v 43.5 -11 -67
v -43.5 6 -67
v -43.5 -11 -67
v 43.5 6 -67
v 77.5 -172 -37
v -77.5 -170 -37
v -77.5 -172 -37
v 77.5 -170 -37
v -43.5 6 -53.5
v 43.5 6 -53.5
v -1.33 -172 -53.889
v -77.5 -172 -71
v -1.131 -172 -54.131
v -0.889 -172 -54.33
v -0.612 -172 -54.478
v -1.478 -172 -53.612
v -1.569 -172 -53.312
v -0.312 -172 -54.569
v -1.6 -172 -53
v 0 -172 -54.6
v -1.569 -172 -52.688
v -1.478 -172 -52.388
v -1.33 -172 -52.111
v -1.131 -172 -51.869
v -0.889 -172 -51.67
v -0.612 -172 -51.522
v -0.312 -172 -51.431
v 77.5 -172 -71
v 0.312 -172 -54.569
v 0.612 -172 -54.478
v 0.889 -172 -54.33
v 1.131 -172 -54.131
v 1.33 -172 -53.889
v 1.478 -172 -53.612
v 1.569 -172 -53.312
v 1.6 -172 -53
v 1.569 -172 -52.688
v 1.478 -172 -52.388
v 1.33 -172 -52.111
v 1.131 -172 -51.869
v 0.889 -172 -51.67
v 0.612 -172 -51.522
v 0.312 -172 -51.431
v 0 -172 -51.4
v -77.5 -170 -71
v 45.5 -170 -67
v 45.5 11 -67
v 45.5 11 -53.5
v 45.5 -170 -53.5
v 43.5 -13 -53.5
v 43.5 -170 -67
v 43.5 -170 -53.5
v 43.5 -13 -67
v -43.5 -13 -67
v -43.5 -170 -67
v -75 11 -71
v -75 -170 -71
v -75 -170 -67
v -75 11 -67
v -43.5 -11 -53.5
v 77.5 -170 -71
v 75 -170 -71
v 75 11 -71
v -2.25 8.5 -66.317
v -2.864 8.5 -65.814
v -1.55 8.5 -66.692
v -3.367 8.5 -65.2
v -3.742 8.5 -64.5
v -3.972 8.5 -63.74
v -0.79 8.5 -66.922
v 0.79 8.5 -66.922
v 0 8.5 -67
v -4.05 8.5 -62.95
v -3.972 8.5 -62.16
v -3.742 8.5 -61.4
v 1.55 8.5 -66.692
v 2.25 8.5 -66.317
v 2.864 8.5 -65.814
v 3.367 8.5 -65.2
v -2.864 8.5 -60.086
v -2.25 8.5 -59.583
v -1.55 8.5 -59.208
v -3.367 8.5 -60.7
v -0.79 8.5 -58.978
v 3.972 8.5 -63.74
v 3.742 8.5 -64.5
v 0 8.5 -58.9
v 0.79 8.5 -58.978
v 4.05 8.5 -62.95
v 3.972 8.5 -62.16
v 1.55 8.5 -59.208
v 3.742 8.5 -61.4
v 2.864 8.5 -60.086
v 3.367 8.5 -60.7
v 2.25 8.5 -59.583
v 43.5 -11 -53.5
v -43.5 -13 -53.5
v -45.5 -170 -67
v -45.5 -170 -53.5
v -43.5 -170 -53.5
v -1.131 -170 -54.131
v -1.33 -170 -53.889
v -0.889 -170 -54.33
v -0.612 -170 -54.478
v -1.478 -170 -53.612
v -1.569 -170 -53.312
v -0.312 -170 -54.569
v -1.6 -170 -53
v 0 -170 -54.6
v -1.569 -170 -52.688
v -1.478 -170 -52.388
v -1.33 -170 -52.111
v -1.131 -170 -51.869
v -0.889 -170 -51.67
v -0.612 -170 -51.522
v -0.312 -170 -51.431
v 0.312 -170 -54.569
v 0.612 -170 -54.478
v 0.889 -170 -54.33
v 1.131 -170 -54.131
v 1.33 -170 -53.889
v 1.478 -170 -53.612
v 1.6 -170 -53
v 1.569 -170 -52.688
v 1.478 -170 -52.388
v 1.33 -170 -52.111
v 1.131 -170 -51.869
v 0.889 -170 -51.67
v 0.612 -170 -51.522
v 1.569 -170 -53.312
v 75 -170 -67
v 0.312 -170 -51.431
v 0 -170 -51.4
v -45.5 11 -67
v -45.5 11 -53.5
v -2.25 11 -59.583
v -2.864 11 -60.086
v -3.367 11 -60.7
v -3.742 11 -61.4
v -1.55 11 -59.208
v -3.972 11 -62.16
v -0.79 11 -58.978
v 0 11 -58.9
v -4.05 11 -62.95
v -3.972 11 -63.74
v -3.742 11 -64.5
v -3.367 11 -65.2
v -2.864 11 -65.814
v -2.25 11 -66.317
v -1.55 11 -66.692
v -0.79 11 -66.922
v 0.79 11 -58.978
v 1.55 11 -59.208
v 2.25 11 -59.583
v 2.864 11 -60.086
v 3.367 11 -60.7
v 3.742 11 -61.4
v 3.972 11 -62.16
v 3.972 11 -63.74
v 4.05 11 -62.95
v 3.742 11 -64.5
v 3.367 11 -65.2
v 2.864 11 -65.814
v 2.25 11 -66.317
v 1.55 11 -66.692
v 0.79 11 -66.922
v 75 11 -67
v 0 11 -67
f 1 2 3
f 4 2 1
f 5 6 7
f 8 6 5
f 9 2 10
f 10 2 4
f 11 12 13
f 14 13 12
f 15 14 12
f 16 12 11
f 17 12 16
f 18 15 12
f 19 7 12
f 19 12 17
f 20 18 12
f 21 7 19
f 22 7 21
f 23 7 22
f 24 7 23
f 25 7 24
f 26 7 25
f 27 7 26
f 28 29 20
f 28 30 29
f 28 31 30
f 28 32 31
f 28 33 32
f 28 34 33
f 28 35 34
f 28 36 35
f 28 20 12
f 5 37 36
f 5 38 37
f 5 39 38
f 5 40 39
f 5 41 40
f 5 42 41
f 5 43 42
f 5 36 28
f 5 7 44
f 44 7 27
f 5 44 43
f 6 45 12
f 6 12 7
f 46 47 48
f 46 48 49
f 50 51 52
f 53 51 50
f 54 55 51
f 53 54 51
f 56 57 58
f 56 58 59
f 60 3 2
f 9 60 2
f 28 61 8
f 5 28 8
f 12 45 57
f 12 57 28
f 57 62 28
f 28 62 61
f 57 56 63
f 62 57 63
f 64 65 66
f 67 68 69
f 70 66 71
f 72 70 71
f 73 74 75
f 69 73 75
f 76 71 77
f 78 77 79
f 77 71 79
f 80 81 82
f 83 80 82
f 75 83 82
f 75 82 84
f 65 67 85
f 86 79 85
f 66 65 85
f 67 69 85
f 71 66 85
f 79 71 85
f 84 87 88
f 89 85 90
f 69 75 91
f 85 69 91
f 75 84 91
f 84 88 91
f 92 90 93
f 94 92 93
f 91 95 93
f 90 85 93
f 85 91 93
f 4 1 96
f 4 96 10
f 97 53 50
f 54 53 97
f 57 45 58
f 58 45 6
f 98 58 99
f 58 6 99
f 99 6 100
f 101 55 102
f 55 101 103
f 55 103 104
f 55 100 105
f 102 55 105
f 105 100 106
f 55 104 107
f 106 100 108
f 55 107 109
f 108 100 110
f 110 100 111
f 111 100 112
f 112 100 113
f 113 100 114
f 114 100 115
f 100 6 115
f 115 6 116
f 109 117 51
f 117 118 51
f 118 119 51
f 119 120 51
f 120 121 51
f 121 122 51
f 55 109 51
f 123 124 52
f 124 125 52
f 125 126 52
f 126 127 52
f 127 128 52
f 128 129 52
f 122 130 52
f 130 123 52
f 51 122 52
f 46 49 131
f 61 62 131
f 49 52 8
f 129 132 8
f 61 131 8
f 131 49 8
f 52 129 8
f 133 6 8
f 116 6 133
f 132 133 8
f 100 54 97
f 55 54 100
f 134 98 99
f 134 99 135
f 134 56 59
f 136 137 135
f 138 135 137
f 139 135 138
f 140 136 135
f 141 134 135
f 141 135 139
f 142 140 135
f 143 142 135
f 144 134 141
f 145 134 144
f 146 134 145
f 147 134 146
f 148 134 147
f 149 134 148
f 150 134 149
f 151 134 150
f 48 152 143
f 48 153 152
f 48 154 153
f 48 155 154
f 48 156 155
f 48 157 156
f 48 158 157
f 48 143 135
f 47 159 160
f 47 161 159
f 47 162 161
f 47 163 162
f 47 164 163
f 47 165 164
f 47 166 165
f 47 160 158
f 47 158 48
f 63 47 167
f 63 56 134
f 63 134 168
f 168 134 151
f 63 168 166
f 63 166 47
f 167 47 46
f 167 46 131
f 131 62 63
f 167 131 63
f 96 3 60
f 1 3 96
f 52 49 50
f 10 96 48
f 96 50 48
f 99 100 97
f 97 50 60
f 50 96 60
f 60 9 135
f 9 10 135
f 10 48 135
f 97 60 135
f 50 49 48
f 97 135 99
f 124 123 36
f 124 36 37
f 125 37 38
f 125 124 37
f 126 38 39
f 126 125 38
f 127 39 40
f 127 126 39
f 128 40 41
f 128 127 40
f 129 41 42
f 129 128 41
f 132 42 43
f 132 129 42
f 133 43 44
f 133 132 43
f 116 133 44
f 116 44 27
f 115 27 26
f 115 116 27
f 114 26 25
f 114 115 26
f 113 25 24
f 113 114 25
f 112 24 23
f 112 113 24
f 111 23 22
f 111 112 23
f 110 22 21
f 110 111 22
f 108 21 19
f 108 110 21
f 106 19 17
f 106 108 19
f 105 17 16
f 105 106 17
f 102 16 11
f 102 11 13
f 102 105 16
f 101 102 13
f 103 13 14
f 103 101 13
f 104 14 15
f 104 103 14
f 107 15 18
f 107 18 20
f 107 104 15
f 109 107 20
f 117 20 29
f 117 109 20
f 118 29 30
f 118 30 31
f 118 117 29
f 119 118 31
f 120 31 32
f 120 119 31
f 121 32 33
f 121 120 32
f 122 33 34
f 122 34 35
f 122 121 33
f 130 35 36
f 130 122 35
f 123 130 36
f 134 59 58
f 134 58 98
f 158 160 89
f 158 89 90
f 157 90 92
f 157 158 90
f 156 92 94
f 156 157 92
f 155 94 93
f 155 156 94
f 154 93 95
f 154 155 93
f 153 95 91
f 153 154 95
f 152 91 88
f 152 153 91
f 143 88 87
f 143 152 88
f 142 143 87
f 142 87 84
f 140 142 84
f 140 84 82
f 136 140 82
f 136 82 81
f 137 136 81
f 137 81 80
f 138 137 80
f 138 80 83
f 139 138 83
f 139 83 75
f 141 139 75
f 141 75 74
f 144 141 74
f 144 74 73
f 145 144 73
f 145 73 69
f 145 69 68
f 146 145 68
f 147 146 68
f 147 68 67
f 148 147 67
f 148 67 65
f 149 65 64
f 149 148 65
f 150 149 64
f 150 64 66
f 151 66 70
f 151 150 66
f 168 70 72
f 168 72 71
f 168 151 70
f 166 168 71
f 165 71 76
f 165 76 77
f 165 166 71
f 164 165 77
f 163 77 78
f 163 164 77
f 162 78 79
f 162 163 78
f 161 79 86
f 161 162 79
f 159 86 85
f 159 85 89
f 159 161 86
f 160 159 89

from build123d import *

# Parameters (mm, degrees)
SKETCH056_W     = 150
SKETCH056_H     = 181
PAD017_DEPTH    = 4
SKETCH057_W     = 87
SKETCH057_H     = 17
PAD018_DEPTH    = 13.5
SKETCH058_W     = 155
SKETCH058_H     = 34
PAD019_DEPTH    = 2
SKETCH059_R     = 1.6
POCKET014_DEPTH = 2
SKETCH082_R     = 4.05
POCKET023_DEPTH = 3


with BuildPart() as part:
    # Sketch056 → Pad017 (new body)
    with BuildSketch(Plane.XY):
        with Locations((0, -4)):
            Rectangle(SKETCH056_W, SKETCH056_H)
    extrude(amount=PAD017_DEPTH)

    # Sketch057 (on DatumPlane) → Pad018 (join)
    with BuildSketch(Plane.XY.offset(4)):
        Polygon((-45.5, 86.5), (45.5, 86.5), (45.5, -94.5), (43.5, -94.5), (43.5, 62.5), (-43.5, 62.5), (-43.5, -94.5), (-45.5, -94.5), align=None)
        with Locations((0, 73)):
            Rectangle(SKETCH057_W, SKETCH057_H, mode=Mode.SUBTRACT)
    extrude(amount=PAD018_DEPTH)

    # Sketch058 (on DatumPlane) → Pad019 (join)
    with BuildSketch(Plane.XZ.offset(94.5)):
        with Locations((0, 17)):
            Rectangle(SKETCH058_W, SKETCH058_H)
    extrude(amount=PAD019_DEPTH)

    # Sketch059 (on DatumPlane) → Pocket014 (cut)
    with BuildSketch(Plane.XZ.offset(94.5)):
        with Locations((0, 18)):
            Circle(SKETCH059_R)
    extrude(amount=POCKET014_DEPTH, mode=Mode.SUBTRACT)

    # Sketch082 (on DatumPlane) → Pocket023 (cut)
    with BuildSketch(Plane.XZ.offset(-87)):
        with Locations((0, 8.05)):
            Circle(SKETCH082_R)
    extrude(amount=POCKET023_DEPTH, mode=Mode.SUBTRACT)


with BuildPart() as part_1:
    # Body007 placement: moved
    add(part.part.moved(Location((0, -75.5, -71))))


solid = part_1.part
